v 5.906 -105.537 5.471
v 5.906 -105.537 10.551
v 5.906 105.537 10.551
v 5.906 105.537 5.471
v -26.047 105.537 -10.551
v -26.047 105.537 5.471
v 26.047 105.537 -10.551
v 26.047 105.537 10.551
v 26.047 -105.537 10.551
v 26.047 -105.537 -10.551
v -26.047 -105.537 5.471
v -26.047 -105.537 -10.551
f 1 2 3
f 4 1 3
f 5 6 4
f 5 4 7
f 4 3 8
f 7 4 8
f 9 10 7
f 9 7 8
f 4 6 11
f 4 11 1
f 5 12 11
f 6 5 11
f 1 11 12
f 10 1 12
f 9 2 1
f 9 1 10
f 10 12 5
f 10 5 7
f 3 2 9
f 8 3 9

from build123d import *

# Parameters (mm, degrees)
F0_W     = 52.0943142474
F0_H     = 21.1019426874
F1_DEPTH = 105.537
F2_W     = 31.9535313174
F2_H     = 211.074
F3_DEPTH = 5.08


with BuildPart() as f1:
    # F0 (on Front) → F1 (new body, symmetric)
    with BuildSketch(Plane.XZ):
        Rectangle(F0_W, F0_H)
    extrude(amount=F1_DEPTH, both=True)

    # F2 (on face) → F3 (cut)
    with BuildSketch(Plane.XY.offset(10.5509713437)):
        with Locations((-10.070391465, 0)):
            Rectangle(F2_W, F2_H)
    extrude(amount=-F3_DEPTH, mode=Mode.SUBTRACT)


solid = f1.part
